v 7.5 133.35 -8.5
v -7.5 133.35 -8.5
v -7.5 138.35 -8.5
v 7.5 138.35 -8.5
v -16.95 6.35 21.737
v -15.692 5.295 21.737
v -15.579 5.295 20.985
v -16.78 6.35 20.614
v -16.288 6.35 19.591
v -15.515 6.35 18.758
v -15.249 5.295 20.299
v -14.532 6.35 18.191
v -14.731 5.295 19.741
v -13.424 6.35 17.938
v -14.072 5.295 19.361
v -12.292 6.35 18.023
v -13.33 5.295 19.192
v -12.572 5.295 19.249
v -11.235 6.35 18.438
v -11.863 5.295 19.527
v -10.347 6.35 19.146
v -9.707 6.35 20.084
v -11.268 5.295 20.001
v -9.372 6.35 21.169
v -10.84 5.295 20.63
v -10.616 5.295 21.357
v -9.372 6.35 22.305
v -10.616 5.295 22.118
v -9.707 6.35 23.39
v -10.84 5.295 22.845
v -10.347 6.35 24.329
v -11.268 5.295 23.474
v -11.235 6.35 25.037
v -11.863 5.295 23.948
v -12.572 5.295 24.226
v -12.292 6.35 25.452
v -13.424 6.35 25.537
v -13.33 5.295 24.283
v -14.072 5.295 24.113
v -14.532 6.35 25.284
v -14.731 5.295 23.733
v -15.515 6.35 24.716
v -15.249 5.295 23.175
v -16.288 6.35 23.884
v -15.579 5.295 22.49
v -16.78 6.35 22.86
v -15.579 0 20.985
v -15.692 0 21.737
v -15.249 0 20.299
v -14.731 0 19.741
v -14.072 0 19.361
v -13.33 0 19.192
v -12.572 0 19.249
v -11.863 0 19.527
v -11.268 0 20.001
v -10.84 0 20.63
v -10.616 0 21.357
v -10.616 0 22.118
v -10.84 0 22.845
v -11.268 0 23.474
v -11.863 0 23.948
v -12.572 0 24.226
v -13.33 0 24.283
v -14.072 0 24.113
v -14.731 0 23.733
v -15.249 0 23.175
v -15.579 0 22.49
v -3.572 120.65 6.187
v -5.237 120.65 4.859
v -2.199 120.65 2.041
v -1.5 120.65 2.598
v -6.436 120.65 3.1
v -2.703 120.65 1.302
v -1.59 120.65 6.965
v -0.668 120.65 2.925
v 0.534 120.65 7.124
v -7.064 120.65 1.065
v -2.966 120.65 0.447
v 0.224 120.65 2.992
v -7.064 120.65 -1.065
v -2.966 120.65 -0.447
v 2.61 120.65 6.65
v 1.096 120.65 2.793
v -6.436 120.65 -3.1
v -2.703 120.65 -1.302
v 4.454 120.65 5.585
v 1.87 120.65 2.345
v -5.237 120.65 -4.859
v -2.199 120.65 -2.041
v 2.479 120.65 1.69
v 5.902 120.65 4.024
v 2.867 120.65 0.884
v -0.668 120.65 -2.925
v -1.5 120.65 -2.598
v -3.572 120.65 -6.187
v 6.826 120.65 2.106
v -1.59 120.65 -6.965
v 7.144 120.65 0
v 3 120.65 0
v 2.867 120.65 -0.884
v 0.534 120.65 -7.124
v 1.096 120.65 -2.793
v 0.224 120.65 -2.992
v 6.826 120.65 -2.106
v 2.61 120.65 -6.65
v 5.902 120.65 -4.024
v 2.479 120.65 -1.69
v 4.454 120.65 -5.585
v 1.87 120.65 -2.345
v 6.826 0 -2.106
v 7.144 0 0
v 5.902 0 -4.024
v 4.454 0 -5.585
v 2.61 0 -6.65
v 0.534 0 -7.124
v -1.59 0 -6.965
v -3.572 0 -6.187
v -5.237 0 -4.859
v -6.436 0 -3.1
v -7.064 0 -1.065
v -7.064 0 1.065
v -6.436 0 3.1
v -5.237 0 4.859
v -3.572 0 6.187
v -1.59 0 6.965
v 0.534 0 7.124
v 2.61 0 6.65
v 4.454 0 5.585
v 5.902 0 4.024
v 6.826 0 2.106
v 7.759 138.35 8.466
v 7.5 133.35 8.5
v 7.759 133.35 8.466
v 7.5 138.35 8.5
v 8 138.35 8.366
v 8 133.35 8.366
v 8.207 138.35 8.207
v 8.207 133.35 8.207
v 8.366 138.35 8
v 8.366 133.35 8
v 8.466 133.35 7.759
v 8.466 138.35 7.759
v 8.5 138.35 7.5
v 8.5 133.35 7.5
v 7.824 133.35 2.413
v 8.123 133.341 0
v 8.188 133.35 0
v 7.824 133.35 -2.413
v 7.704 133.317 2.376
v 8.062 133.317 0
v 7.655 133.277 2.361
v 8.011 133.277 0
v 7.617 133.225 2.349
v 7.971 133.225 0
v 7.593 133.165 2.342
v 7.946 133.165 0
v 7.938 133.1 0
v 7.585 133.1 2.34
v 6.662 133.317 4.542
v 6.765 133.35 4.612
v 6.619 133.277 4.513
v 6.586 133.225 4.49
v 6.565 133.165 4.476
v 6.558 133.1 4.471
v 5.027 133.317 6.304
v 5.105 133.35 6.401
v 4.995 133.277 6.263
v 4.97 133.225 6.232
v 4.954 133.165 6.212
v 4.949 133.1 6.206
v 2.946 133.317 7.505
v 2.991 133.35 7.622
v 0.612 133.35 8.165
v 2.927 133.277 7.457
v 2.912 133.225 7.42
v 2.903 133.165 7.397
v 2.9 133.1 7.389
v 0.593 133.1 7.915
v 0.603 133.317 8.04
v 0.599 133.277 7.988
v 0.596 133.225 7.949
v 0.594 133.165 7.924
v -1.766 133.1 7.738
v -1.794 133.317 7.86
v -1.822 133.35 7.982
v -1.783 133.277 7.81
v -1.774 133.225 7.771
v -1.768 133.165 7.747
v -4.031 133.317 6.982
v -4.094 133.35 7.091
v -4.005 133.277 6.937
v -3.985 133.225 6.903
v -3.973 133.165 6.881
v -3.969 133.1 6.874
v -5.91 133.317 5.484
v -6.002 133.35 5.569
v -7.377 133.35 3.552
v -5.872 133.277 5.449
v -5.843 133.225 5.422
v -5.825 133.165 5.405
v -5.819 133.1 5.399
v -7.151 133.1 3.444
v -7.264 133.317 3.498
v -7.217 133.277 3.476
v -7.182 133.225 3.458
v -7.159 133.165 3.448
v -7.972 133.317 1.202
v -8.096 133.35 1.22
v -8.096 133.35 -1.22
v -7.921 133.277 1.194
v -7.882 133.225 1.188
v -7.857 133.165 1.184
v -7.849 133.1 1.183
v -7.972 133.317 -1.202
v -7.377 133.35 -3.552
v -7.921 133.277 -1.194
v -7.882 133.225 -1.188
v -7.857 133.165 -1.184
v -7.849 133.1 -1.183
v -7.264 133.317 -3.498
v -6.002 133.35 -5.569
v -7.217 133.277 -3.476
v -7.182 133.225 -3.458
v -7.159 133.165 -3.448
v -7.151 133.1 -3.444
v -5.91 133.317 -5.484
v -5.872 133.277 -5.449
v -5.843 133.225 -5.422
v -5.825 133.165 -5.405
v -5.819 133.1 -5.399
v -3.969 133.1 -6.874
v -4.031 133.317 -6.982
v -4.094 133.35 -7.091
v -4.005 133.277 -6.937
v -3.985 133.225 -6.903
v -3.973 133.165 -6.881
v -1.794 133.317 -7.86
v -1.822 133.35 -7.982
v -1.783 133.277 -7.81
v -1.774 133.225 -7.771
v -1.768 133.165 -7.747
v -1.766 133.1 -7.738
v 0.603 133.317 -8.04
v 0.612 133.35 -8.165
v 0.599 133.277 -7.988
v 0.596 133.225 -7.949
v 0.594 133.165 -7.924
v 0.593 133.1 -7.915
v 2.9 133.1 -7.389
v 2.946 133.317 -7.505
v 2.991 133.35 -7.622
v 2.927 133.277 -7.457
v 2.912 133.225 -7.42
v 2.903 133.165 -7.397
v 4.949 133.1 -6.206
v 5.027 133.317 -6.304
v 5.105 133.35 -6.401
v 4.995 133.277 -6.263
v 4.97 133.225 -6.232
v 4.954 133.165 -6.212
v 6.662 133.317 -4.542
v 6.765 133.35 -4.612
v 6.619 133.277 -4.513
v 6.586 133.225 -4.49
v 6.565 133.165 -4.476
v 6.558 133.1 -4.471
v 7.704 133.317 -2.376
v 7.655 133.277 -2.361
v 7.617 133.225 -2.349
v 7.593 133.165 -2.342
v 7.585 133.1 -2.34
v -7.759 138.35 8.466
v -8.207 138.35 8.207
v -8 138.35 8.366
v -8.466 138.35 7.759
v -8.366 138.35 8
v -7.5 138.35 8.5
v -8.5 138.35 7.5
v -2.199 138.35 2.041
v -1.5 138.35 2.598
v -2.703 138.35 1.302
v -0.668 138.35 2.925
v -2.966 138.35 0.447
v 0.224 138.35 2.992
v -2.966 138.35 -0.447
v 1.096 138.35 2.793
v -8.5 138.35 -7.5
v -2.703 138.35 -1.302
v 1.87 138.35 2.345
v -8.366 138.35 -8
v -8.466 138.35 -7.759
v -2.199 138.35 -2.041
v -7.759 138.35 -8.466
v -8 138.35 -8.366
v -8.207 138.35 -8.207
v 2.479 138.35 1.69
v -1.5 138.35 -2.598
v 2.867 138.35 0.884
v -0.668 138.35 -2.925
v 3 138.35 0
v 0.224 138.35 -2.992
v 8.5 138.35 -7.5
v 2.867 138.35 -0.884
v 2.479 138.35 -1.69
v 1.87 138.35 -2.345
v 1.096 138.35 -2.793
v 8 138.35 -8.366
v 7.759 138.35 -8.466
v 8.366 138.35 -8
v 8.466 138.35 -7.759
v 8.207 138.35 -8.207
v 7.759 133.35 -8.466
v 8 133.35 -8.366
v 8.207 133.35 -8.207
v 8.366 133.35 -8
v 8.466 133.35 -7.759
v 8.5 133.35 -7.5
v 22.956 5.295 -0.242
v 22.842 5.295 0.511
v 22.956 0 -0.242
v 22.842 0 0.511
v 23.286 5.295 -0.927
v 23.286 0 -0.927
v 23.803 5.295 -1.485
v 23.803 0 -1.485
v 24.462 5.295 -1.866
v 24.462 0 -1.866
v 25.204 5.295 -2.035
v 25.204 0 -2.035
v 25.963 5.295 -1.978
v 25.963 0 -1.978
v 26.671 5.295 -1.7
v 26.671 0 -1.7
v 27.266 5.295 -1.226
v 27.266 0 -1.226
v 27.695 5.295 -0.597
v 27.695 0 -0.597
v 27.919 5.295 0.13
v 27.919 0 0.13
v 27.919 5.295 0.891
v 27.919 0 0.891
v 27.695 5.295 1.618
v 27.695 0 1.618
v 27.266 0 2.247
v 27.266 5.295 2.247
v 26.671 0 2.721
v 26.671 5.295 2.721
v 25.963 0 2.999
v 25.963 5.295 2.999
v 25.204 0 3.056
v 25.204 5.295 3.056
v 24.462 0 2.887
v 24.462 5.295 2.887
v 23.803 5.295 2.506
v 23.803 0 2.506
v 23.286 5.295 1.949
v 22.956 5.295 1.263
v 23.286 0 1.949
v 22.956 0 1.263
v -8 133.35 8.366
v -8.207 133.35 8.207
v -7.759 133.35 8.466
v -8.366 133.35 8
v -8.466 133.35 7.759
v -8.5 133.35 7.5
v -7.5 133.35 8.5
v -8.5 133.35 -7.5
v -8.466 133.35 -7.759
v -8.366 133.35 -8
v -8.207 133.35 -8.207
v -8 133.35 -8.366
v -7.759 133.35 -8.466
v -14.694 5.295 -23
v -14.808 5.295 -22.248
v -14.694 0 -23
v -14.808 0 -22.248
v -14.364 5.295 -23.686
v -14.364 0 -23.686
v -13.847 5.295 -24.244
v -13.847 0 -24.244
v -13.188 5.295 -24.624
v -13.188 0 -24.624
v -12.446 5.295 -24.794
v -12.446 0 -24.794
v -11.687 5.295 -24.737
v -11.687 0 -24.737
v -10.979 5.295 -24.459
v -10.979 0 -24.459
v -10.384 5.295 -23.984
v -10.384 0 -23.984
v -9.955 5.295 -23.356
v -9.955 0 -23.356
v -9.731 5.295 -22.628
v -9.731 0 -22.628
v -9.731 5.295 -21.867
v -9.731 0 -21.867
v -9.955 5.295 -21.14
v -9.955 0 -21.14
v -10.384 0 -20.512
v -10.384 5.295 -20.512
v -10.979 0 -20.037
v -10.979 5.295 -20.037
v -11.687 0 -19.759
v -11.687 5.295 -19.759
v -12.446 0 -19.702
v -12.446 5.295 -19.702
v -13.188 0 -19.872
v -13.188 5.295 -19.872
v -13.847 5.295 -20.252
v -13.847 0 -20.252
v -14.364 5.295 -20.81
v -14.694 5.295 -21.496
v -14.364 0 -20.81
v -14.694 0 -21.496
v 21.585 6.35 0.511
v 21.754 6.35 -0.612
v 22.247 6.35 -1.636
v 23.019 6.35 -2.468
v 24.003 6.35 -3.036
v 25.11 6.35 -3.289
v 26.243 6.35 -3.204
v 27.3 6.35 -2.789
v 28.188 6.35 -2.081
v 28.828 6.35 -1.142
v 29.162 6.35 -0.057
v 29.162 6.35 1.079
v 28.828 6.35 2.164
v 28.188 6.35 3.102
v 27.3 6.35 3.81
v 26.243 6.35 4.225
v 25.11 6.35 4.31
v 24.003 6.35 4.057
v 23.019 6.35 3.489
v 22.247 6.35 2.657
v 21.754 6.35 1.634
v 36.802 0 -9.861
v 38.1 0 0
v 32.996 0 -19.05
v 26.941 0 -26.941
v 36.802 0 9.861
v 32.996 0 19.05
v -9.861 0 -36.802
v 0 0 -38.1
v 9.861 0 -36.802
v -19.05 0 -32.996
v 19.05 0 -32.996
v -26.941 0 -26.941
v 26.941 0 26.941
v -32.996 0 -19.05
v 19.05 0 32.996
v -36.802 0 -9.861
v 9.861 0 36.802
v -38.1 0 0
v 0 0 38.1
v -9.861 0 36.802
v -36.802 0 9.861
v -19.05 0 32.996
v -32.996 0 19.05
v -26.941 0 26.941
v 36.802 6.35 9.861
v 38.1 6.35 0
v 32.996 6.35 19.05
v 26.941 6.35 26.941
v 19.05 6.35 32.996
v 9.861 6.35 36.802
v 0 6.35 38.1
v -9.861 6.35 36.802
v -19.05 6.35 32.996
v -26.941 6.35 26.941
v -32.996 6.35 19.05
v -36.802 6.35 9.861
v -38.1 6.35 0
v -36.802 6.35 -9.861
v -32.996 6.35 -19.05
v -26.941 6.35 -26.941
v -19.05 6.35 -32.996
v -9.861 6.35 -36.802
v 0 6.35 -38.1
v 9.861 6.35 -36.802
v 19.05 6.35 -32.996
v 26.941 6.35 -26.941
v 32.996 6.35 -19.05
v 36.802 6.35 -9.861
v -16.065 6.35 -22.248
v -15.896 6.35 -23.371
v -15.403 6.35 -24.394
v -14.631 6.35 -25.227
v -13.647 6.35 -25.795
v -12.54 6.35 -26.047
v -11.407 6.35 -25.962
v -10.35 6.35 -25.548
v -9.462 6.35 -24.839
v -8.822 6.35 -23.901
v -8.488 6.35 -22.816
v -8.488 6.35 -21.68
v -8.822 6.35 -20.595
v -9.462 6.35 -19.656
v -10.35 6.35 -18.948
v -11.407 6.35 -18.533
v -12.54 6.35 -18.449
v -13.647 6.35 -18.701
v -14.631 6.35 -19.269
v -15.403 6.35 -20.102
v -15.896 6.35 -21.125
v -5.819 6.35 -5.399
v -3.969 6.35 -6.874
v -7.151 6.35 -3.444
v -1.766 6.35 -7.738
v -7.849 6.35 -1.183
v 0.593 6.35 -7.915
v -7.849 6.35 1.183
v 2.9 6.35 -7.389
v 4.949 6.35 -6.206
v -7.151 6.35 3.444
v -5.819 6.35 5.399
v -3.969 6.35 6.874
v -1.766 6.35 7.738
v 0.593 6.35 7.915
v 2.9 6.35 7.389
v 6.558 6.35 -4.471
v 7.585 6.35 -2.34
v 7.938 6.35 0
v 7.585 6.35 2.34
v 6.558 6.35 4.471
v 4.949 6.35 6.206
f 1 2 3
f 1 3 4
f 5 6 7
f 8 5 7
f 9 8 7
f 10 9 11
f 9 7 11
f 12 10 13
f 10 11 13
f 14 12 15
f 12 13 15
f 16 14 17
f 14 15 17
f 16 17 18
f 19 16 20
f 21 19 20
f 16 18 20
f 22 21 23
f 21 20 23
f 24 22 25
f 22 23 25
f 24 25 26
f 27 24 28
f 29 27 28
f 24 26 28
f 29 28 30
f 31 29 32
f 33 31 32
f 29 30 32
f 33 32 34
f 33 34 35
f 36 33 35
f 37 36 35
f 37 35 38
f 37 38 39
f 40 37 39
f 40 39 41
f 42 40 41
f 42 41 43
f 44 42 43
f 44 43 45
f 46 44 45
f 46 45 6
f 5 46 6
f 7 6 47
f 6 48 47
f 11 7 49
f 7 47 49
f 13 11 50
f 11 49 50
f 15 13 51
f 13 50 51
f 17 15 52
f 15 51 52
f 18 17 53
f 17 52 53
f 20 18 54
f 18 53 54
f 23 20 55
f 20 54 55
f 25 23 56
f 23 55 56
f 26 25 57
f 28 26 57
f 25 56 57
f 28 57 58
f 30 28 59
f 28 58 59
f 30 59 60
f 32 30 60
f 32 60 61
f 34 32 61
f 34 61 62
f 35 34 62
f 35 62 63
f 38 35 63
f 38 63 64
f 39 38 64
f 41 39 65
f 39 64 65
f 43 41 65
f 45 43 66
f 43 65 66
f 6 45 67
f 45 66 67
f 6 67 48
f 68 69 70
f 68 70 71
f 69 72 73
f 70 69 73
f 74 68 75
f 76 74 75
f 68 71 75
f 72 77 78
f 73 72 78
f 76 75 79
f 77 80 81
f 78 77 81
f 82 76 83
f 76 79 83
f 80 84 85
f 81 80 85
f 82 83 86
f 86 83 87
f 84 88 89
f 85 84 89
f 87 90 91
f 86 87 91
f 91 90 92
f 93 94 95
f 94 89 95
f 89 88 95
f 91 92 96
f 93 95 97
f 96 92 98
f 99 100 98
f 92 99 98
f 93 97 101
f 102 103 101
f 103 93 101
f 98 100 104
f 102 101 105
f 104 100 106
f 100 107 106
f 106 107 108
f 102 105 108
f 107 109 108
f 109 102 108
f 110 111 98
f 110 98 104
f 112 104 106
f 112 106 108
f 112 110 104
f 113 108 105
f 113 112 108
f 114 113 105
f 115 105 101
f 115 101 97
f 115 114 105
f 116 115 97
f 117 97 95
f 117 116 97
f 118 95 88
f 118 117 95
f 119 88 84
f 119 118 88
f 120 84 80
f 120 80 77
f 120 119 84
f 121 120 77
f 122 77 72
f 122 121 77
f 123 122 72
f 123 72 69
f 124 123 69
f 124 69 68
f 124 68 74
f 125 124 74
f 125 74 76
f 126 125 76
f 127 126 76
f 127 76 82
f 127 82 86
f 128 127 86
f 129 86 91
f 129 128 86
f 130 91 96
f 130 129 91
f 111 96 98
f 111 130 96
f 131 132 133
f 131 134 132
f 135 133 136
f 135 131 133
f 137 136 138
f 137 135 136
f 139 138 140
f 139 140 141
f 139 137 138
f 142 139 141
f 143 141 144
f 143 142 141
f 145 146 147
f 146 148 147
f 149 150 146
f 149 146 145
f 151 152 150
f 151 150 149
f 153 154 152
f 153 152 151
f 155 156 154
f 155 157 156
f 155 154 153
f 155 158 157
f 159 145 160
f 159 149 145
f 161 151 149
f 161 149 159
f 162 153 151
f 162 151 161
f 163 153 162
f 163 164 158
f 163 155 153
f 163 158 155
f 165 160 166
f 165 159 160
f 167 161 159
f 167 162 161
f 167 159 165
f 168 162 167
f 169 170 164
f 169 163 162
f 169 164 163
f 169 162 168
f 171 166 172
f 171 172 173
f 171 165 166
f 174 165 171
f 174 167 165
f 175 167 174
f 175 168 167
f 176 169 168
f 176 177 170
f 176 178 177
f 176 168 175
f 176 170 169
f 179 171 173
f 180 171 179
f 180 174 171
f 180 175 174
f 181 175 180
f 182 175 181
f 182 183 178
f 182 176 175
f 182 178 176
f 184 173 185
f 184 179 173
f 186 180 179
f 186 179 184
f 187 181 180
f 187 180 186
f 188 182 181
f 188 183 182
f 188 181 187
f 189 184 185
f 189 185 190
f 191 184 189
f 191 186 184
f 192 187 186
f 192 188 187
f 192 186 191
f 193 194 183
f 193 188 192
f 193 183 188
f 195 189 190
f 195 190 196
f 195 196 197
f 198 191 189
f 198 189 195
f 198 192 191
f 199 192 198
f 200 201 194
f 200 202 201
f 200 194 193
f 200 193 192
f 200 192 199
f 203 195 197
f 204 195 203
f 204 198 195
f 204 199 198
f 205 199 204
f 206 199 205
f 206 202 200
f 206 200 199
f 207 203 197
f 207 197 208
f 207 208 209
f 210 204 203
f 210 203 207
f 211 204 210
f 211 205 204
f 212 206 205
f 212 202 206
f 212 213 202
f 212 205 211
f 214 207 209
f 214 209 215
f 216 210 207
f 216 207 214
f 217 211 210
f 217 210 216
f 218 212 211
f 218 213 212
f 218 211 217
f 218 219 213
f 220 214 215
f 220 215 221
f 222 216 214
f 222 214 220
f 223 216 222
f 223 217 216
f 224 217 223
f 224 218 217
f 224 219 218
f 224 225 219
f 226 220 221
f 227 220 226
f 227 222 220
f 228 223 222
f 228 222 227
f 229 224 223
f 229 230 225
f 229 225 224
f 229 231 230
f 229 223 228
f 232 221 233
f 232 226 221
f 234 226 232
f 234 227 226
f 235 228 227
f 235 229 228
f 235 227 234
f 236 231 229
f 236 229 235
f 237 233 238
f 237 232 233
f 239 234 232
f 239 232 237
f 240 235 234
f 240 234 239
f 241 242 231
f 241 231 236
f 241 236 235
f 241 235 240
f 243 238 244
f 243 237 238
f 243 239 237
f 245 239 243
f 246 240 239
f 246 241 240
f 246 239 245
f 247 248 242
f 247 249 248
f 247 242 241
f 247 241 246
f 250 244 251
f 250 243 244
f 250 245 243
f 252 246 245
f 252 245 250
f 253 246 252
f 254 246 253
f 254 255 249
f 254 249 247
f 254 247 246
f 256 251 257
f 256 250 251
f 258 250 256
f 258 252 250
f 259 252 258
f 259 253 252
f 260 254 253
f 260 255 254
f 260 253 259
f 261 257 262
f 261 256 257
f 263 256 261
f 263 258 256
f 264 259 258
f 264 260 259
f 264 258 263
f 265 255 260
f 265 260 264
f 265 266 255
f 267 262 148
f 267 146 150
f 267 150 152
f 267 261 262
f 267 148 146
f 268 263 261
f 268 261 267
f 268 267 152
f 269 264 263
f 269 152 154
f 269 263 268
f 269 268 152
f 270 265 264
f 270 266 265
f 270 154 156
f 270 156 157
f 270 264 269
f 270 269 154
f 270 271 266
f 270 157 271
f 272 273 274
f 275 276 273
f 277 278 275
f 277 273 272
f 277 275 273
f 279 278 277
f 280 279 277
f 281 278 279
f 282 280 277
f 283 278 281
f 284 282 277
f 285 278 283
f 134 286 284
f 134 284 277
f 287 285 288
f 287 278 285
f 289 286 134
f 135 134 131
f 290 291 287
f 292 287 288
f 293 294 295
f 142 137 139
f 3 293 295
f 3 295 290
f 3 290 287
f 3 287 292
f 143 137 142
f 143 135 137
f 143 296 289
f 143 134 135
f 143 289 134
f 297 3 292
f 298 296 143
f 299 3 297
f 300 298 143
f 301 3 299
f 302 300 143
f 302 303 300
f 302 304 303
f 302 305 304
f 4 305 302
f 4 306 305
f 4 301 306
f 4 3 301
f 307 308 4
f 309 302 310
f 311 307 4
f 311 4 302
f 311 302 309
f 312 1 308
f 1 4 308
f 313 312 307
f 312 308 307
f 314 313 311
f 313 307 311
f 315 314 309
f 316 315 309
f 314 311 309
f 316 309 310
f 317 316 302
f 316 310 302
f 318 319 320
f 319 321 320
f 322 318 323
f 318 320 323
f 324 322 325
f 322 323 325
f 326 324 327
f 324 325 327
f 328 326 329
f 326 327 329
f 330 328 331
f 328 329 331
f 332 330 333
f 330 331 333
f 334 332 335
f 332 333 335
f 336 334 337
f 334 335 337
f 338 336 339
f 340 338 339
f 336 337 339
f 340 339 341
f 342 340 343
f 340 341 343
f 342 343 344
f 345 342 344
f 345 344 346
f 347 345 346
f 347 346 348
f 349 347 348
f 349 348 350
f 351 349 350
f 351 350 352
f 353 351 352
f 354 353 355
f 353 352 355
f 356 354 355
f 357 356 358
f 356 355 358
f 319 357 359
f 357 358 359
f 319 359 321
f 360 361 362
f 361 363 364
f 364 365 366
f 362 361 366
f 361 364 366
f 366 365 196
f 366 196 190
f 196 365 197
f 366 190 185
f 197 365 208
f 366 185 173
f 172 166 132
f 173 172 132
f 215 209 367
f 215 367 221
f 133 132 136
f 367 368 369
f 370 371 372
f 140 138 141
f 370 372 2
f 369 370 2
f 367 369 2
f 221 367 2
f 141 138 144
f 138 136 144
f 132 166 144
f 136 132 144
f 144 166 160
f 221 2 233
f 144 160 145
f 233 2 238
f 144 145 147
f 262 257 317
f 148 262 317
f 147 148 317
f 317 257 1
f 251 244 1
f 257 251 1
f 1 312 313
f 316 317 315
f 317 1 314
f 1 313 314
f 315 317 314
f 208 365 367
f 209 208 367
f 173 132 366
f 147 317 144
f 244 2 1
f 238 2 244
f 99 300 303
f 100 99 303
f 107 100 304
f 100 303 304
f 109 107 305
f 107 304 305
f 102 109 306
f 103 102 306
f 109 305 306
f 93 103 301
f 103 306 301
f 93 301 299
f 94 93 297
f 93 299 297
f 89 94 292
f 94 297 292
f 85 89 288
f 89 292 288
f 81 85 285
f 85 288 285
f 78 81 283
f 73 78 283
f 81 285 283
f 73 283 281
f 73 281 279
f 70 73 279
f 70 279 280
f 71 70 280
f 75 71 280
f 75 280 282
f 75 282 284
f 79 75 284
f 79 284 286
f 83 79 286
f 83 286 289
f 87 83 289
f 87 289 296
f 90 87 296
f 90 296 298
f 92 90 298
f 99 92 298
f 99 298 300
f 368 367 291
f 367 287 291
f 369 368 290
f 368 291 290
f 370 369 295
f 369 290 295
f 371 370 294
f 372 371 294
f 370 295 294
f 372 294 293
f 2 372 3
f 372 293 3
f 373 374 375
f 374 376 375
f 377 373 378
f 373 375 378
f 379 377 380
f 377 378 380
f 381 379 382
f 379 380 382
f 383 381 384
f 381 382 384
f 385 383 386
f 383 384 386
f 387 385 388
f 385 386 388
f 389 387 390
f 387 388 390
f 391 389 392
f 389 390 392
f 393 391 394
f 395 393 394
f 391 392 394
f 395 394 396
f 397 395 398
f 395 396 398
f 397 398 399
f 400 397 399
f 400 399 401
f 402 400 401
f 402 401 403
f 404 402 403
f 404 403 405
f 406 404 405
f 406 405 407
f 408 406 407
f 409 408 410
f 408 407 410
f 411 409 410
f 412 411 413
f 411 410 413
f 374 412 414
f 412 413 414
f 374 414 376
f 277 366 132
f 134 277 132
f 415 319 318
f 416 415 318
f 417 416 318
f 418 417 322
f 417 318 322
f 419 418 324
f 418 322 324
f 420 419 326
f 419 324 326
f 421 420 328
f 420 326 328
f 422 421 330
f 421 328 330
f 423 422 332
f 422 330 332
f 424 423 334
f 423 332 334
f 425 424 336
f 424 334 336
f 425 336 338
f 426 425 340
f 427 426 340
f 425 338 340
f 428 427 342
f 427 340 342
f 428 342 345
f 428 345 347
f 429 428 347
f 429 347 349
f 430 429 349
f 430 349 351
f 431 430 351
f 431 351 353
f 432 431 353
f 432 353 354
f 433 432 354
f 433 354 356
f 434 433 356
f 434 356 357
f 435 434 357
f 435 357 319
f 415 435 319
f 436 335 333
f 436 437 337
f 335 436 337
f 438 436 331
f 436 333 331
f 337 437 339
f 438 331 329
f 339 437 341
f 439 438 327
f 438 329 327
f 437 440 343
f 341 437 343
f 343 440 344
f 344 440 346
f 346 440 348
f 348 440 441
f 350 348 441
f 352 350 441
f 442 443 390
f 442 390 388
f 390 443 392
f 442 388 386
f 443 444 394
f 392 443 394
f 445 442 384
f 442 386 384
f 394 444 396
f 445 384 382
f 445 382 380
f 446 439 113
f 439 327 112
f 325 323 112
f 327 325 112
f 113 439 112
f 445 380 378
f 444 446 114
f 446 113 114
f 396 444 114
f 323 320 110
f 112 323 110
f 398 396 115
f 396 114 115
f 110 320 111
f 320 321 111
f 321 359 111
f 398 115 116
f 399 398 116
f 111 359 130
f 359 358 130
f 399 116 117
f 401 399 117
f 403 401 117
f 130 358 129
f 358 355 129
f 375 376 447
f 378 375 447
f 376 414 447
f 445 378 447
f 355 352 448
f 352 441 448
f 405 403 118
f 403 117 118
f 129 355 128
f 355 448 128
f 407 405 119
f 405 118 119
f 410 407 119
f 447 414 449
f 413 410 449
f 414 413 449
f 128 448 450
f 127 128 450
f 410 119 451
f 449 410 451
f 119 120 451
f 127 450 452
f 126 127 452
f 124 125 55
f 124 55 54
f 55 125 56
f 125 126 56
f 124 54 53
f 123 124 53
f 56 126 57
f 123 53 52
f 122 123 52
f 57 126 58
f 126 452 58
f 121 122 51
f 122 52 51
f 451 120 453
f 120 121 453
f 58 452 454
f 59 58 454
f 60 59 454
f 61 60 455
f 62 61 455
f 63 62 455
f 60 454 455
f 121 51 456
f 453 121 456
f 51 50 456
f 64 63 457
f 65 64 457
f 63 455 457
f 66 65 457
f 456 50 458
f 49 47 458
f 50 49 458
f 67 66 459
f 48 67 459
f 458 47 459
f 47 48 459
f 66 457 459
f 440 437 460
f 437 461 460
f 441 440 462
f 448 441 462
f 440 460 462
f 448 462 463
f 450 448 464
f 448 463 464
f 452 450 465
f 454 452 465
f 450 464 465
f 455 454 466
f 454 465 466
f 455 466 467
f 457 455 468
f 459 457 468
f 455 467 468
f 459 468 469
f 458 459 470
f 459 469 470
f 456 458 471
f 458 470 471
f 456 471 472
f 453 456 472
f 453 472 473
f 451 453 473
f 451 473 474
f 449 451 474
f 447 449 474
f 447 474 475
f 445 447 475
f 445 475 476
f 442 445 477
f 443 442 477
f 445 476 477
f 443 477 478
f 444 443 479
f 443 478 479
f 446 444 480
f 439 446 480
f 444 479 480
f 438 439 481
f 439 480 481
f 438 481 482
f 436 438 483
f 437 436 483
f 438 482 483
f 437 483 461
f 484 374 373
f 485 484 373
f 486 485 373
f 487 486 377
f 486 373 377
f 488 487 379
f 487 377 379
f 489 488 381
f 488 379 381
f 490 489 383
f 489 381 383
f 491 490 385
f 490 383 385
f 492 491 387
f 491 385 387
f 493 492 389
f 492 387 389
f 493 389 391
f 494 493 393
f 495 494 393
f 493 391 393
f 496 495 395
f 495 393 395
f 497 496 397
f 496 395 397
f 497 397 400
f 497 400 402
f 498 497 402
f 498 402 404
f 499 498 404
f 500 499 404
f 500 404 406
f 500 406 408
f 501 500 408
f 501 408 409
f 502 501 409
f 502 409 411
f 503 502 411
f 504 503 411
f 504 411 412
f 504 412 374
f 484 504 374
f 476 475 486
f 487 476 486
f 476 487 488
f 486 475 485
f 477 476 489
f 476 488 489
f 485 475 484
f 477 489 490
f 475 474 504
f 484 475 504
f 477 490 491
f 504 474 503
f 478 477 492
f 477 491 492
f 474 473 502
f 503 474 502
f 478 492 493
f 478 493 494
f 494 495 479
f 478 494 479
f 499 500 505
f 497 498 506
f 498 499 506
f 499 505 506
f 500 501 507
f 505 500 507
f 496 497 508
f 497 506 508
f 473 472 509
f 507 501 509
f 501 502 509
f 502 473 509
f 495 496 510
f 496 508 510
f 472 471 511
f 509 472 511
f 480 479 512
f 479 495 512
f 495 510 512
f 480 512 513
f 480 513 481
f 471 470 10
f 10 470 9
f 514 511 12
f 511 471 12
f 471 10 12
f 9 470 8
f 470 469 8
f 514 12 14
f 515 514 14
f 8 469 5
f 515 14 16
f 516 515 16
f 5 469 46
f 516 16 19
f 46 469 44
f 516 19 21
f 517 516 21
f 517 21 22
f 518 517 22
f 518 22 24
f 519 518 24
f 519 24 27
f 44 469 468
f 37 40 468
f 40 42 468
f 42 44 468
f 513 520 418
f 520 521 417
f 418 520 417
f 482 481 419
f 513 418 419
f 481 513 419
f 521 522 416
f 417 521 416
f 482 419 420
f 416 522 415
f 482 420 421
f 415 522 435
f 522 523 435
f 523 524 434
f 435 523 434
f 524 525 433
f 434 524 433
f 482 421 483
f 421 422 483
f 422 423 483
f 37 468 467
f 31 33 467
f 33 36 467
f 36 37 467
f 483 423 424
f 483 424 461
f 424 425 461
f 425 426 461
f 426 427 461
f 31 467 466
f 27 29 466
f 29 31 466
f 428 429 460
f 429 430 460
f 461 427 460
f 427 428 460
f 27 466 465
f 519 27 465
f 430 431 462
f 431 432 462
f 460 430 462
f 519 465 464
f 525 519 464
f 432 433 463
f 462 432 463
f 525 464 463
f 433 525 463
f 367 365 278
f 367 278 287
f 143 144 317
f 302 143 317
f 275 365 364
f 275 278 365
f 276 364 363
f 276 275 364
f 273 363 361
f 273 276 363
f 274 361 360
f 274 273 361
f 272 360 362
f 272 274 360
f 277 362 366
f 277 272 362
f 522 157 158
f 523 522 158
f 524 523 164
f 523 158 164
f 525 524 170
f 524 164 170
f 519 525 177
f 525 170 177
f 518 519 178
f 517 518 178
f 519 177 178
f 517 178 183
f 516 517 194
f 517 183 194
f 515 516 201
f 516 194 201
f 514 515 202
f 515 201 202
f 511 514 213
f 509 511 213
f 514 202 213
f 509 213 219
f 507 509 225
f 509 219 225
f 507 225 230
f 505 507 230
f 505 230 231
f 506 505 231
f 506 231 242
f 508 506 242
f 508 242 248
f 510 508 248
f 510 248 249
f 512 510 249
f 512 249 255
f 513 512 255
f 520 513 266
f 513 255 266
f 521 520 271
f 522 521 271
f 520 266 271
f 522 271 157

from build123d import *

# Parameters (mm, degrees)
SKETCH2_R                         = 7.14375
CUT_EXTRUDE1_DEPTH                = 120.65
SKETCH5_W                         = 17
SKETCH5_H                         = 17
BOSS_EXTRUDE3_DEPTH               = 5
SKETCH4_R                         = 3
CUT_EXTRUDE2_DEPTH                = 139.35
FILLET1_R                         = 1
FILLET2_R                         = 0.25
F_1_4_20_TAPPED_HOLE1_D           = 5.1054
F_1_4_20_TAPPED_HOLE1_CSINK_D     = 7.62
F_1_4_20_TAPPED_HOLE1_CSINK_ANGLE = 100


with BuildPart() as part:
    # Sketch1 → Revolve1 (revolve)
    with BuildSketch(Plane.XY):
        Polygon((0, 0), (38.1, 0), (38.1, 6.35), (7.9375, 6.35), (7.9375, 133.35), (0, 133.35), align=None)
    revolve(axis=Axis((0, 131.17698584, 0), (0, -1, 0)))

    # Sketch2 → Cut-Extrude1 (cut)
    with BuildSketch(Plane(origin=(0, 0, 0), x_dir=(1, 0, 0), z_dir=(0, 1, 0))):
        Circle(SKETCH2_R)
    extrude(amount=CUT_EXTRUDE1_DEPTH, mode=Mode.SUBTRACT)

    # Sketch5 → Boss-Extrude3 (add)
    with BuildSketch(Plane(origin=(0, 133.35, 0), x_dir=(1, 0, 0), z_dir=(0, 1, 0))):
        Rectangle(SKETCH5_W, SKETCH5_H)
    extrude(amount=BOSS_EXTRUDE3_DEPTH)

    # Sketch4 → Cut-Extrude2 (cut, through all)
    with BuildSketch(Plane(origin=(0, 138.35, 0), x_dir=(1, 0, 0), z_dir=(0, 1, 0))):
        Circle(SKETCH4_R)
    extrude(amount=-CUT_EXTRUDE2_DEPTH, mode=Mode.SUBTRACT)

    # Fillet1
    fillet1_edges = [part.edges().sort_by_distance(p)[0] for p in [
        (8.5, 135.85, 8.5),
        (8.5, 135.85, -8.5),
        (-8.5, 135.85, -8.5),
        (-8.5, 135.85, 8.5),
    ]]
    fillet(fillet1_edges, radius=FILLET1_R)

    # Fillet2
    fillet2_edges = [part.edges().sort_by_distance(p)[0] for p in [
        (-7.9375, 133.35, 0),
    ]]
    fillet(fillet2_edges, radius=FILLET2_R)

    # 1/4-20 Tapped Hole1 (through all)
    with Locations(Plane(origin=(0, 6.35, 0), x_dir=(1, 0, 0), z_dir=(0, 1, 0))):
        with Locations((-13.139703049, -21.737253823), (-12.255162495, 22.24794355), (25.394865544, -0.510689727)):
            CounterSinkHole(F_1_4_20_TAPPED_HOLE1_D / 2, F_1_4_20_TAPPED_HOLE1_CSINK_D / 2, counter_sink_angle=F_1_4_20_TAPPED_HOLE1_CSINK_ANGLE)


solid = part.part
